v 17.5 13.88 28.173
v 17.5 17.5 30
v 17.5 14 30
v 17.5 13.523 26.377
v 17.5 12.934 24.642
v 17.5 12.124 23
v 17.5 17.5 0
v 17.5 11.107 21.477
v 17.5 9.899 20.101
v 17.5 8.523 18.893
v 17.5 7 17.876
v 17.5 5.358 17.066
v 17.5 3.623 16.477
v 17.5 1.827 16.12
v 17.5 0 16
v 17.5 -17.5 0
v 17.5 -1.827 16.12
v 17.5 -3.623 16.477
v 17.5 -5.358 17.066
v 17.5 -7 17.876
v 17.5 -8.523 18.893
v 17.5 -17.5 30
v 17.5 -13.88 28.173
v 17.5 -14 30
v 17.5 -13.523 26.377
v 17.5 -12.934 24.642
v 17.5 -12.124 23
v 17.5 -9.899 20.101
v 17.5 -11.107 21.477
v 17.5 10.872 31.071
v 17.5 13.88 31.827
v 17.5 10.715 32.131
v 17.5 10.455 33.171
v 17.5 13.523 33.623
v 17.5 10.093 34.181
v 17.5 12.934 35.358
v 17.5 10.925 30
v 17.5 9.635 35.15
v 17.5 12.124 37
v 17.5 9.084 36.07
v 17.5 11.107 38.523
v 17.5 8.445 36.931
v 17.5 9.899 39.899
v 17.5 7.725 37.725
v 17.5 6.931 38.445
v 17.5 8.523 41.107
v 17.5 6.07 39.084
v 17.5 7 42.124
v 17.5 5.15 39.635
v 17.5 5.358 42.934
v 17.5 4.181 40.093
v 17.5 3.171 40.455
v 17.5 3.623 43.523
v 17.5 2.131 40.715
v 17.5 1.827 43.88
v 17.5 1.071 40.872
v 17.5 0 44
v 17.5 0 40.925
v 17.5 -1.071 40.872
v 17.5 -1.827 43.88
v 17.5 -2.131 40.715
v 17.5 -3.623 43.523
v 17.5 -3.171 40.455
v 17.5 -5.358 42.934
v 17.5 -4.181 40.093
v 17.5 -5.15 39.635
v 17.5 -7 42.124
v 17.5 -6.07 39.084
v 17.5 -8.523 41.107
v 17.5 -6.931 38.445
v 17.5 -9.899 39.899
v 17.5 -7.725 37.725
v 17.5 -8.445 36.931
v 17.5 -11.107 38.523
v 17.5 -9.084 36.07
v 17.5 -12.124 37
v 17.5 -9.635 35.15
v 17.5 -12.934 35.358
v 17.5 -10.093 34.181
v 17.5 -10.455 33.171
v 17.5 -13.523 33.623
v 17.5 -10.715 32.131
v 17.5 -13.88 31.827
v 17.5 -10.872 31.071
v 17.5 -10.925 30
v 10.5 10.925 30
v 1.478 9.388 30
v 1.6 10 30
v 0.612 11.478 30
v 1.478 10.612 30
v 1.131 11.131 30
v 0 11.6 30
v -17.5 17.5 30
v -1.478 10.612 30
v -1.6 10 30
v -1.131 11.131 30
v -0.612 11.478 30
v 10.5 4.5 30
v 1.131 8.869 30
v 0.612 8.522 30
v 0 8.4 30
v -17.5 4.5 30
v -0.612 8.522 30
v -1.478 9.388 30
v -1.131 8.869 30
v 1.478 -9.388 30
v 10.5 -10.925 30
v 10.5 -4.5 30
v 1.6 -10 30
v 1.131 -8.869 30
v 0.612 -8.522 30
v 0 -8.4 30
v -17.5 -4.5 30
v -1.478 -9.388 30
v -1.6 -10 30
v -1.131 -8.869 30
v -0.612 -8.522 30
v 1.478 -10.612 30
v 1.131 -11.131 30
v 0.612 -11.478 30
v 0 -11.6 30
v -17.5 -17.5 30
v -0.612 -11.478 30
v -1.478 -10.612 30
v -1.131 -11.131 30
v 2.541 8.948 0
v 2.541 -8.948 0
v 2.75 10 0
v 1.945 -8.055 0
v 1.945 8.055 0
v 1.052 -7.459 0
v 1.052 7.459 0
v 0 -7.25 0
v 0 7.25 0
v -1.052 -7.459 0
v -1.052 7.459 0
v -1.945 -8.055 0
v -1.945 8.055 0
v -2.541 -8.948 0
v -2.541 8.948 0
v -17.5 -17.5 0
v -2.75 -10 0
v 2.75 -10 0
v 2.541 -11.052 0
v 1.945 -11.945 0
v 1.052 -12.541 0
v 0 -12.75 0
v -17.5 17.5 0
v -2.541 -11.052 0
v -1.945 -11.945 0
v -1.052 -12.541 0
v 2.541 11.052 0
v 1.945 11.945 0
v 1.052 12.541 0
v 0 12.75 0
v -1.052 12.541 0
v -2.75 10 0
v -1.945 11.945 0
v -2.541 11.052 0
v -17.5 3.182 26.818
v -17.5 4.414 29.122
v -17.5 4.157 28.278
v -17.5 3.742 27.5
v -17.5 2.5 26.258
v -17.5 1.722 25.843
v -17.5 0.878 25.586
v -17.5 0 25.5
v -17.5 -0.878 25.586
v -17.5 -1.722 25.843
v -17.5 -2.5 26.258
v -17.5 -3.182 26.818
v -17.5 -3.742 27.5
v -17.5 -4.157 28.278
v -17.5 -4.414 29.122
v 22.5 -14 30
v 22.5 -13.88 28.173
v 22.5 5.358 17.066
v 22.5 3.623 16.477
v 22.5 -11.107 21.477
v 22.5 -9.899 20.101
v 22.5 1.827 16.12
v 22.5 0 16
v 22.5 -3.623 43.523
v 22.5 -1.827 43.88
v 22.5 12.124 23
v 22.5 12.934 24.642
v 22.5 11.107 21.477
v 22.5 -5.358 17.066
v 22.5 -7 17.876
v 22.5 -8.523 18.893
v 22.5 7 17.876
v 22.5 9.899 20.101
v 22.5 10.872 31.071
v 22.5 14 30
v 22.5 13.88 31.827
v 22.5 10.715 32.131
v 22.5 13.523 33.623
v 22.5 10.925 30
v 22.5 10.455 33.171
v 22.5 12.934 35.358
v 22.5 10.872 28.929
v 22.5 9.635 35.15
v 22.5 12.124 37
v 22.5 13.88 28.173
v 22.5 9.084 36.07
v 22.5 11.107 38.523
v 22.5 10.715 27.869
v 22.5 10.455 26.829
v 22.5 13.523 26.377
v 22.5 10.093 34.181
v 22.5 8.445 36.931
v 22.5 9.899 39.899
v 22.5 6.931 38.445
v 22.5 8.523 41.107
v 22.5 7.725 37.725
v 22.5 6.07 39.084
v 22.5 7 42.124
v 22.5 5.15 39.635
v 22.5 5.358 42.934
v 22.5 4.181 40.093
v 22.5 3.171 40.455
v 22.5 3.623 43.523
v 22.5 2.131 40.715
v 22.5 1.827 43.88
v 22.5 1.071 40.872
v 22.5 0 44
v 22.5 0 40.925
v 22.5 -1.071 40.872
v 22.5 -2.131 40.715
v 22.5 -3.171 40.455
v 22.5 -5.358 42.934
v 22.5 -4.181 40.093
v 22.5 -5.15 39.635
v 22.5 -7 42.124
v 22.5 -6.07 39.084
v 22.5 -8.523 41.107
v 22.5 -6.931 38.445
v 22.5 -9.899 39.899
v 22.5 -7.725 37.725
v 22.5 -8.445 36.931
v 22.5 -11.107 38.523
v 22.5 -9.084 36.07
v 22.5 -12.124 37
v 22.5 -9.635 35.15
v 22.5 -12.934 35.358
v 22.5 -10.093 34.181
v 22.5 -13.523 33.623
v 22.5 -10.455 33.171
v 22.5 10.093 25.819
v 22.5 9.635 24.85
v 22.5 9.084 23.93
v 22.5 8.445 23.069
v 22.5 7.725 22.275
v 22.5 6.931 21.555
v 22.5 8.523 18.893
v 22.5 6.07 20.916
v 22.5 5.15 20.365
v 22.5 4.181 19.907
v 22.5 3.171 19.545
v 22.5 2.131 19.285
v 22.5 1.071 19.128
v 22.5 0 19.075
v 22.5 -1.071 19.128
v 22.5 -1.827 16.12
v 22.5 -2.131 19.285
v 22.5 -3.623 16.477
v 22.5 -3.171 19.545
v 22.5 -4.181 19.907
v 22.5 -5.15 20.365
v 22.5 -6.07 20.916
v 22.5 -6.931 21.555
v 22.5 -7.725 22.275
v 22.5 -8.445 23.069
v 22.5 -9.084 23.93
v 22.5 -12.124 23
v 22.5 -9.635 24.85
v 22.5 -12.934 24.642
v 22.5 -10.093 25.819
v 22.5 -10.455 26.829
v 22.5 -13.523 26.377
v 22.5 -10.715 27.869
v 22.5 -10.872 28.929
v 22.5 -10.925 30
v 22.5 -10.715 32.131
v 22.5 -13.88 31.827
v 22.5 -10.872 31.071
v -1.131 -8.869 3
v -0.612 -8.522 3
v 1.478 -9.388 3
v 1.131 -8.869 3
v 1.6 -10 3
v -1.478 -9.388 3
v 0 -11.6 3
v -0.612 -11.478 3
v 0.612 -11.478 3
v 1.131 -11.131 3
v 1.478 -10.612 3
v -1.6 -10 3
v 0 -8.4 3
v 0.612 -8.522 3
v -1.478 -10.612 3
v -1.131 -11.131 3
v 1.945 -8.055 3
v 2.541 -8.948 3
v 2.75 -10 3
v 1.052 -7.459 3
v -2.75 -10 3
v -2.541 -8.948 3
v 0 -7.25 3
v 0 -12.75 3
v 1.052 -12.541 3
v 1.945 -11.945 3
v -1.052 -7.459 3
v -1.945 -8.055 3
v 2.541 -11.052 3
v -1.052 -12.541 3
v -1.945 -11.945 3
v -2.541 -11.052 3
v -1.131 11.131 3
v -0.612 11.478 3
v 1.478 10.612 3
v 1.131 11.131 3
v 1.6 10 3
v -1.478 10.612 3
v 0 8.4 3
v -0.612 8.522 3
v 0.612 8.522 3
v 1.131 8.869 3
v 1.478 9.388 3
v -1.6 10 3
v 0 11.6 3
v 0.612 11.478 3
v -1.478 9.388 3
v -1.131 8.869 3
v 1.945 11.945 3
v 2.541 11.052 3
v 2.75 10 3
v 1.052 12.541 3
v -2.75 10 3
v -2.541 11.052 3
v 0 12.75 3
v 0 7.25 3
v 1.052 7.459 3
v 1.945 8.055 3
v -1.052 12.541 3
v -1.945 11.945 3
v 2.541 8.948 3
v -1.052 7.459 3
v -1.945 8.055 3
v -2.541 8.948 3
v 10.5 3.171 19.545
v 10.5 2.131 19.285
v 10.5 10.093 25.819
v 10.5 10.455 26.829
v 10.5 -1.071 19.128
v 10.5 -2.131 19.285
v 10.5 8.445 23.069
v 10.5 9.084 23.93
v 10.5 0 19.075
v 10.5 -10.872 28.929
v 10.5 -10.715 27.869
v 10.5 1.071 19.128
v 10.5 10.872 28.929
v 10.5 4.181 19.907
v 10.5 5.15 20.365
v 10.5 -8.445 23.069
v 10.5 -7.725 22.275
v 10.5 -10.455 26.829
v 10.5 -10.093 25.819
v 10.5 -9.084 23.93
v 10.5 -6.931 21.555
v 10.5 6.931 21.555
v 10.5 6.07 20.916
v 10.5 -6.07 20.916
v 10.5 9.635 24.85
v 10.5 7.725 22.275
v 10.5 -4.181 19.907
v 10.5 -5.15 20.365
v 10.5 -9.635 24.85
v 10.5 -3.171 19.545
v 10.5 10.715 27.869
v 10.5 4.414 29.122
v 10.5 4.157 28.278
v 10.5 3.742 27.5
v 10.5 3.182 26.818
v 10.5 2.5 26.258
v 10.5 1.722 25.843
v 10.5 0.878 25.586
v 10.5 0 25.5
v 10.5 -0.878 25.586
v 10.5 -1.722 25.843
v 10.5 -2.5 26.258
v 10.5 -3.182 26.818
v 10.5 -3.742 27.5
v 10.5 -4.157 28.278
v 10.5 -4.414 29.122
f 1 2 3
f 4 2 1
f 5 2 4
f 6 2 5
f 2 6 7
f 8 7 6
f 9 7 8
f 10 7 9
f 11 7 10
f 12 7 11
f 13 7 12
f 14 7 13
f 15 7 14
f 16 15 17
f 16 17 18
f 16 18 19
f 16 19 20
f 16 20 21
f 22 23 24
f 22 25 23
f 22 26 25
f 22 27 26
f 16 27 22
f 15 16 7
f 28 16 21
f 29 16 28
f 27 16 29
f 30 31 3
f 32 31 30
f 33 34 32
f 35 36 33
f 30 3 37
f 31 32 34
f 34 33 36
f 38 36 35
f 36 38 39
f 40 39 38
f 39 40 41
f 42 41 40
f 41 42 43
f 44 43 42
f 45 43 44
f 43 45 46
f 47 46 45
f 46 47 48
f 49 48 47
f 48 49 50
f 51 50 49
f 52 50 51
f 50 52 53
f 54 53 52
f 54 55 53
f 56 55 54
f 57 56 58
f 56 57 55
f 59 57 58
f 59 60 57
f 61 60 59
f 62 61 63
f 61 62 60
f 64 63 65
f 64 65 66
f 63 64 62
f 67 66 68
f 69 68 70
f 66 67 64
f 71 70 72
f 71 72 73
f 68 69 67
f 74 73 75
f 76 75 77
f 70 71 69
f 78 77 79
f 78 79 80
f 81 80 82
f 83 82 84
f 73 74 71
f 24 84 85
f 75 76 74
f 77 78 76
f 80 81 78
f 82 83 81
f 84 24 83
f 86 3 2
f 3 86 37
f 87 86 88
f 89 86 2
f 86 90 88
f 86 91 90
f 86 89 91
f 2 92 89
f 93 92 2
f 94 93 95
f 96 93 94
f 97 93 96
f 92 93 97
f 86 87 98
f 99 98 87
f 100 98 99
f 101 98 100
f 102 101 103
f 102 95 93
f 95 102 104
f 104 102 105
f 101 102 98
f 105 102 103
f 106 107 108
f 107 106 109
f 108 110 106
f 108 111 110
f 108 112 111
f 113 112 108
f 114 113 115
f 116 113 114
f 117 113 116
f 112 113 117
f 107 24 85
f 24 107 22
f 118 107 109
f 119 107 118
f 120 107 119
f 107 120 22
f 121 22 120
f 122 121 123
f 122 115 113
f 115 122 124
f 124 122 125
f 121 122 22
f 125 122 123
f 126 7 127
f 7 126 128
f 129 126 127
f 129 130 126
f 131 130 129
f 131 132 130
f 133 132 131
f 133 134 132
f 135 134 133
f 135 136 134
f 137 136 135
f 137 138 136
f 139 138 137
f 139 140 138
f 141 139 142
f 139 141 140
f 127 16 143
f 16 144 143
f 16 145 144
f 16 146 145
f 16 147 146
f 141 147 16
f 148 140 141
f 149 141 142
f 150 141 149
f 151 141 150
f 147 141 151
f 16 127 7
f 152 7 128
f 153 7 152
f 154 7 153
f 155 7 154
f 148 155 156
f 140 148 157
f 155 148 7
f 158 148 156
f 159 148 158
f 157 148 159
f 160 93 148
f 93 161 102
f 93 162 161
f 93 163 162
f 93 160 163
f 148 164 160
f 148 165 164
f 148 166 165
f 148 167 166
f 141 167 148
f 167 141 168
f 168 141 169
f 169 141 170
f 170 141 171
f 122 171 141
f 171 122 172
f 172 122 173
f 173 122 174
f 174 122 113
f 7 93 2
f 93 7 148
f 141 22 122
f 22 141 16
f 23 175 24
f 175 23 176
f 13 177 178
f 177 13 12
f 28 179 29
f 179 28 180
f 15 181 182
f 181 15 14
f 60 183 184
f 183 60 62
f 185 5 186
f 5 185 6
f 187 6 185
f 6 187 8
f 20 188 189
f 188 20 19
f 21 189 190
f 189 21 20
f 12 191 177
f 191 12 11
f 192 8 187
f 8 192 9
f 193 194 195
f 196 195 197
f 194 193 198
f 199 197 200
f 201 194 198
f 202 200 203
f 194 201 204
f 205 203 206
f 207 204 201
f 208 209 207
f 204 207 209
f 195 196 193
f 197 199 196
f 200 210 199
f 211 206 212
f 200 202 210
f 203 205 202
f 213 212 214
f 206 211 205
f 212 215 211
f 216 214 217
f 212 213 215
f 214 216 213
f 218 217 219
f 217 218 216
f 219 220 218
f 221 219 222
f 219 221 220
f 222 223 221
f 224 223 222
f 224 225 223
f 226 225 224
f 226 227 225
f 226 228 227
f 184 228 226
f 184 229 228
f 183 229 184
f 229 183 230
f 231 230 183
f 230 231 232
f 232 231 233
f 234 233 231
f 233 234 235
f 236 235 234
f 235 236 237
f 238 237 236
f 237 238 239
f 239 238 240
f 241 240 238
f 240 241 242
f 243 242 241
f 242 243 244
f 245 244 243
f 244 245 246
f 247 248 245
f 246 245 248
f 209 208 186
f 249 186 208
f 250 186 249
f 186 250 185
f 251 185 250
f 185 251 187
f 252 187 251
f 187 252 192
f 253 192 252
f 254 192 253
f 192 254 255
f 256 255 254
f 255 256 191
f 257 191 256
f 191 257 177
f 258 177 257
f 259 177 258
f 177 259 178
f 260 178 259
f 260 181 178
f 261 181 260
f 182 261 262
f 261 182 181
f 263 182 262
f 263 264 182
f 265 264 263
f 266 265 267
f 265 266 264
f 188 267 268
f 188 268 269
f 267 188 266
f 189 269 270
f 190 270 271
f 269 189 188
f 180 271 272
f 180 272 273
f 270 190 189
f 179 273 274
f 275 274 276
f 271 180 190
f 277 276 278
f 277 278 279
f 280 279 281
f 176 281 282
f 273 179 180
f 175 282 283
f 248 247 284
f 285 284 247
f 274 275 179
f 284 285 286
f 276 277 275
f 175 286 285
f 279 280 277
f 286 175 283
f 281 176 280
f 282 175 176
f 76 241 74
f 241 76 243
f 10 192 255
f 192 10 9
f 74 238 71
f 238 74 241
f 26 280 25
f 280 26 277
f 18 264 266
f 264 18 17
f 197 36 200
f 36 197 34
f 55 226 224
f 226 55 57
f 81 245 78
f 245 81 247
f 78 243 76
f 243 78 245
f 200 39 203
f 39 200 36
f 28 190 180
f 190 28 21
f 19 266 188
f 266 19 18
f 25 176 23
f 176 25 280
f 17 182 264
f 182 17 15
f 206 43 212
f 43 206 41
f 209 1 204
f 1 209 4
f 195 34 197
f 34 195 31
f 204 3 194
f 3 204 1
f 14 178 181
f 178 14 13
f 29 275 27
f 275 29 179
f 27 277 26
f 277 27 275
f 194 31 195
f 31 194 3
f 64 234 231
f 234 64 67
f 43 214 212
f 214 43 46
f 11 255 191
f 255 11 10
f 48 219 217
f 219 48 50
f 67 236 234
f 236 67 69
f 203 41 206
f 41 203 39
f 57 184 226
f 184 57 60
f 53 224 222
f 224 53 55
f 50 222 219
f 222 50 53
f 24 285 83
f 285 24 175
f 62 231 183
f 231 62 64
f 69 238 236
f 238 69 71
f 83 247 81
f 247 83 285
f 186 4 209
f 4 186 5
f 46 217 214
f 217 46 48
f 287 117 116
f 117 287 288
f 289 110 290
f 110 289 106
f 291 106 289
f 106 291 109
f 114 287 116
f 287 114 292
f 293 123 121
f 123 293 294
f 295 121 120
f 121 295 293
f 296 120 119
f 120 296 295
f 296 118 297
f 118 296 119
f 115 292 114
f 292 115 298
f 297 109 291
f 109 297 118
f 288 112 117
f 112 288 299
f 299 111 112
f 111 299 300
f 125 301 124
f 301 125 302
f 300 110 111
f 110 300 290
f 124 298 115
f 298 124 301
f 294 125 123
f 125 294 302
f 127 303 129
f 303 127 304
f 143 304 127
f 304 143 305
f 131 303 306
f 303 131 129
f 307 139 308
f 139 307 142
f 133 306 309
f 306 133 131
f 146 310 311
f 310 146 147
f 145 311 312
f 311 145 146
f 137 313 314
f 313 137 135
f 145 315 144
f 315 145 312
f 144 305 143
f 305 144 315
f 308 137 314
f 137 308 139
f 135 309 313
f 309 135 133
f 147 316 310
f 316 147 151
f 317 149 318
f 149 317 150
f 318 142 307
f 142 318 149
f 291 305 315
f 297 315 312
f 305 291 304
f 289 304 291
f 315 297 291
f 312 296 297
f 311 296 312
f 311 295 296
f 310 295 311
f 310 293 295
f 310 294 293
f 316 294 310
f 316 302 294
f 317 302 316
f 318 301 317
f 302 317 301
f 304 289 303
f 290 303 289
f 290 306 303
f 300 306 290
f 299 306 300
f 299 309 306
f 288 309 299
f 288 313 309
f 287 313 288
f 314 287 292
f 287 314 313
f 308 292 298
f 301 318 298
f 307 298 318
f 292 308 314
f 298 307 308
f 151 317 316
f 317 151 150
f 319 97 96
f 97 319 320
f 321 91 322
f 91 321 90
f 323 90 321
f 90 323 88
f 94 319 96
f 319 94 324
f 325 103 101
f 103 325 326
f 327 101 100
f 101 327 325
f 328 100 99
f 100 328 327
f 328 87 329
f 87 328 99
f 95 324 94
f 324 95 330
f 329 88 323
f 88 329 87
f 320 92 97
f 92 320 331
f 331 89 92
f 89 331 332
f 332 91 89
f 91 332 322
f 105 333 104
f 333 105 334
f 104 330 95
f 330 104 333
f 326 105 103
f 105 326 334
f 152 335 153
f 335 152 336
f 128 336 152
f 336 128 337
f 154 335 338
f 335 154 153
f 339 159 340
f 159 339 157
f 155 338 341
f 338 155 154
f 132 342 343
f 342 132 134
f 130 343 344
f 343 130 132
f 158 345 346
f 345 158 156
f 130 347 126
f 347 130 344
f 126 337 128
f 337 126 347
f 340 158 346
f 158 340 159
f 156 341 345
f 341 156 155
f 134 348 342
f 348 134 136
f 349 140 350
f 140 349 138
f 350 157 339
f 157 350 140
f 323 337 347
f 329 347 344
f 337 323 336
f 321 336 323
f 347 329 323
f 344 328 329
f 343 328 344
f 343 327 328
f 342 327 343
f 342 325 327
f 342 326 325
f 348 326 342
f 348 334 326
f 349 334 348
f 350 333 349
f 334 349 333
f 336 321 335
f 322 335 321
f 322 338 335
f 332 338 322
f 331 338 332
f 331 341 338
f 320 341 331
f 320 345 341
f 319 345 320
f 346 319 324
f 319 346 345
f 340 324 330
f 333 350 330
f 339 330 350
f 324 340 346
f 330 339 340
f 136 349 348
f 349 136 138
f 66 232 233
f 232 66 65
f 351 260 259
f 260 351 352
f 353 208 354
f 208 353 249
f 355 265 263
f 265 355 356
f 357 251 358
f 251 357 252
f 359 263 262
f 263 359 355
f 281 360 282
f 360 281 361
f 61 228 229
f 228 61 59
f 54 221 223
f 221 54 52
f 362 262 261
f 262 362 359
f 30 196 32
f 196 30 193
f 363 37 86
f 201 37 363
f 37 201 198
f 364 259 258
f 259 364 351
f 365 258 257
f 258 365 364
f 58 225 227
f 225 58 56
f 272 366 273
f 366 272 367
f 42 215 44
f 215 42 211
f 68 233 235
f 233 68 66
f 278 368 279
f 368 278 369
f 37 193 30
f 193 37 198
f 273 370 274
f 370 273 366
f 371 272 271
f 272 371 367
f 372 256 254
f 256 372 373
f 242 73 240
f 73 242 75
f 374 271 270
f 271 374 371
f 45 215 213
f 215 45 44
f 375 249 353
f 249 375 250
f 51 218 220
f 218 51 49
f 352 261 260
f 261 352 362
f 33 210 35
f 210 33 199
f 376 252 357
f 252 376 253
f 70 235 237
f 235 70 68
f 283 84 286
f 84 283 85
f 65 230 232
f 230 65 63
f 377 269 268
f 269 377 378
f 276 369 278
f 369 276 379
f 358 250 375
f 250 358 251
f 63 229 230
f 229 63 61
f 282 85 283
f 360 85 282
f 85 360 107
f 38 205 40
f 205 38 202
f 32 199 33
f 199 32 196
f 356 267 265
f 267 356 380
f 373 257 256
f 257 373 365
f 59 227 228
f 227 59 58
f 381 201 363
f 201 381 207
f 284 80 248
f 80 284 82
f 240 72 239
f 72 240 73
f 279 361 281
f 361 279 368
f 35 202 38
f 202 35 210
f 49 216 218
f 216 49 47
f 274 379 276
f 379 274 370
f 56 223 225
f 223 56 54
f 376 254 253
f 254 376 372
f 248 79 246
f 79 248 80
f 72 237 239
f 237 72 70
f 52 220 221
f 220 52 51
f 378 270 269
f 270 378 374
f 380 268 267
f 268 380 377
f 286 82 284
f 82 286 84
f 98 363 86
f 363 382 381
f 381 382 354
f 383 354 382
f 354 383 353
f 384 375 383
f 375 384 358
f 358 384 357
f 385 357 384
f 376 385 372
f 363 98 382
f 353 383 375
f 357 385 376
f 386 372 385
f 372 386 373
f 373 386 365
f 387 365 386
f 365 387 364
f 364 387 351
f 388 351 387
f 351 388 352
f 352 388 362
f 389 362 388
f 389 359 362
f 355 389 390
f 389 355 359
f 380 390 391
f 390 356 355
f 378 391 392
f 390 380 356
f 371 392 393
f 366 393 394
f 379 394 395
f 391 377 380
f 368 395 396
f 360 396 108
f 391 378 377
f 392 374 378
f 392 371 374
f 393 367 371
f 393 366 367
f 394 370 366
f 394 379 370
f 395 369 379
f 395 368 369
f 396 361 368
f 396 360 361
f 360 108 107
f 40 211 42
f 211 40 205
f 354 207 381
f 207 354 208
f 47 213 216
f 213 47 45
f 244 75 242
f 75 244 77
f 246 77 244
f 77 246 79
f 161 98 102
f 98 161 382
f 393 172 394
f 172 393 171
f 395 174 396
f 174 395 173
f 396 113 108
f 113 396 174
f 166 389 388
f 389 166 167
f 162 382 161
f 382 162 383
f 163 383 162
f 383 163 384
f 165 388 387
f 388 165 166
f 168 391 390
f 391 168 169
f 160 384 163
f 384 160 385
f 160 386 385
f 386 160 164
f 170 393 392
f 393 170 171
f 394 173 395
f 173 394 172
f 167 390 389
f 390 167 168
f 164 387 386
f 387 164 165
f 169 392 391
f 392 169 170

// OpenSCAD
// file: ../common.scad
/*
 * WAVE OCEAN V10 - COMMON PARAMETERS
 *
 * Shared constants, tolerances, and hardware specifications
 * All dimensions in mm
 *
 * MECHANISM: Helical groove cam drives 24 slats via follower arms
 * - Worm rotates around X axis
 * - Groove follows helix at radius GROOVE_RADIUS
 * - Follower rollers ride in groove, push slats up/down
 * - Phase difference along X creates traveling wave illusion
 */

// ============================================
// PRINT TOLERANCES (tune for your printer)
// ============================================

TOL_CLEARANCE = 0.2;         // Shaft in hole clearance
TOL_PRESS_FIT = -0.15;       // Bearing press-fit interference
TOL_SLIDING = 0.4;           // Sliding fit (guide slots)
TOL_SCREW_HOLE = 0.2;        // Screw hole clearance

// ============================================
// HARDWARE - BEARINGS
// ============================================

// 608 bearing (worm shaft)
BEARING_608_ID = 8;
BEARING_608_OD = 22;
BEARING_608_H = 7;

// 624 bearing (follower rollers)
BEARING_624_ID = 4;
BEARING_624_OD = 13;
BEARING_624_H = 5;

// ============================================
// HARDWARE - FASTENERS
// ============================================

M3_HOLE_DIA = 3 + TOL_SCREW_HOLE;      // 3.2mm
M3_HEAD_DIA = 5.5;
M3_HEAD_H = 3;
M3_NUT_FLAT = 5.5;
M3_NUT_H = 2.4;
M3_INSERT_DIA = 4.0;                    // Heat-set insert hole
M3_INSERT_DEPTH = 5;

// ============================================
// HARDWARE - SHAFTS AND PINS
// ============================================

WORM_SHAFT_DIA = 8;
WORM_SHAFT_LENGTH = 280;               // Extends beyond worm for bearings

ROLLER_AXLE_DIA = 4;
ROLLER_AXLE_LENGTH = 12;

PIVOT_PIN_DIA = 3;
PIVOT_PIN_LENGTH = 15;

// ============================================
// WORM CAM DIMENSIONS
// ============================================

WORM_LENGTH = 200;
WORM_OUTER_RADIUS = 20;              // 40mm diameter (bigger for deeper groove)
WORM_CORE_RADIUS = 10;               // 20mm diameter core
WORM_SHAFT_HOLE = WORM_SHAFT_DIA + TOL_CLEARANCE;  // 8.2mm

// Groove sized to contain 624 bearing roller
GROOVE_WIDTH = BEARING_624_H + 2;    // 7mm wide (bearing + clearance)
GROOVE_DEPTH = BEARING_624_OD/2 + 3; // 9.5mm deep (half bearing + margin)
GROOVE_RADIUS = WORM_OUTER_RADIUS - GROOVE_DEPTH/2;  // ~15mm from center

HELIX_PITCH = 25;                    // 25mm per rotation = 8 turns over 200mm

// ============================================
// SLAT DIMENSIONS
// ============================================

NUM_SLATS = 24;
SLAT_SPACING = WORM_LENGTH / NUM_SLATS;  // 8.33mm

SLAT_WIDTH = 5;                       // X dimension (slightly wider)
SLAT_DEPTH = 30;                      // Y dimension (narrower)
SLAT_HEIGHT = 40;                     // Z dimension

// Wave motion amplitude (half of total travel)
WAVE_AMPLITUDE = 10;                  // ±10mm vertical motion

// ============================================
// FOLLOWER ARM DIMENSIONS
// ============================================

ARM_LENGTH = 35;                      // Pivot to roller center (LONGER)
ARM_WIDTH = 8;
ARM_THICKNESS = 6;

PIVOT_HOLE = PIVOT_PIN_DIA + TOL_CLEARANCE;    // 3.2mm
ROLLER_AXLE_HOLE = ROLLER_AXLE_DIA + TOL_CLEARANCE;  // 4.2mm

// ============================================
// SLAT BRACKET DIMENSIONS
// ============================================

BRACKET_WIDTH = 12;
BRACKET_DEPTH = 20;
BRACKET_HEIGHT = 25;

// ============================================
// GUIDE RAIL DIMENSIONS
// ============================================

GUIDE_LENGTH = 210;
GUIDE_HEIGHT = 30;                    // Taller for more travel
GUIDE_DEPTH = 10;
GUIDE_WALL = 3;

SLOT_WIDTH = SLAT_WIDTH + TOL_SLIDING;   // Slat slides in slot, not bracket tab
SLOT_HEIGHT = WAVE_AMPLITUDE * 2 + 10;   // Allow full travel + margin

// ============================================
// BEARING BLOCK DIMENSIONS
// ============================================

BEARING_BLOCK_WIDTH = 35;
BEARING_BLOCK_DEPTH = 35;
BEARING_BLOCK_HEIGHT = 30;

BEARING_POCKET_DIA = BEARING_608_OD + TOL_PRESS_FIT;  // 21.85mm
BEARING_POCKET_DEPTH = BEARING_608_H + 1;             // 8mm

// ============================================
// BASE PLATE DIMENSIONS
// ============================================

BASE_LENGTH = 280;                    // Longer to fit everything
BASE_WIDTH = 100;                     // Wider for stability
BASE_THICKNESS = 5;

// ============================================
// MOTOR MOUNT DIMENSIONS
// ============================================

N20_BODY_DIA = 12;
N20_BODY_LENGTH = 15;
N20_GEARBOX_DIA = 10;
N20_GEARBOX_LENGTH = 12;
N20_SHAFT_DIA = 3;
N20_SHAFT_LENGTH = 10;

// ============================================
// ASSEMBLY POSITIONS
// ============================================

// Worm center position
// Shaft runs along X axis at this Z height
WORM_CENTER_Z = BASE_THICKNESS + BEARING_BLOCK_HEIGHT;  // 35mm

// Guide rail positions (front and back of slats)
// Slats are centered at Y=0, spanning ±SLAT_DEPTH/2
GUIDE_FRONT_Y = -SLAT_DEPTH/2 - GUIDE_DEPTH/2;   // -20
GUIDE_BACK_Y = SLAT_DEPTH/2 + GUIDE_DEPTH/2;     // +20

// Guide rail Z - slats hang down from here
// Positioned so slat bottom can reach groove at top of worm
GUIDE_Z = WORM_CENTER_Z + WORM_OUTER_RADIUS + SLAT_HEIGHT/2 + 5;  // 80mm

// Bearing block X positions (at ends of worm, inward facing)
BEARING_L_X = -WORM_LENGTH/2 - BEARING_BLOCK_WIDTH/2;   // -117.5
BEARING_R_X = WORM_LENGTH/2 + BEARING_BLOCK_WIDTH/2;    // +117.5

// Motor mount X position (beyond right bearing block)
MOTOR_MOUNT_X = BEARING_R_X + BEARING_BLOCK_WIDTH/2 + 30;

// ============================================
// COLORS (for assembly visualization)
// ============================================

C_WORM = [0.75, 0.55, 0.2];
C_SLAT = [0.2, 0.45, 0.75];
C_BRACKET = [0.4, 0.4, 0.45];
C_ARM = [0.5, 0.5, 0.55];
C_GUIDE = [0.35, 0.35, 0.4];
C_BEARING_BLOCK = [0.3, 0.35, 0.4];
C_BASE = [0.25, 0.25, 0.3];
C_SHAFT = [0.6, 0.6, 0.65];
C_BEARING = [0.7, 0.7, 0.75];
C_MOTOR = [0.3, 0.3, 0.35];

// ============================================
// HELPER FUNCTIONS
// ============================================

// Helix angle at position X along worm (in degrees)
function helix_angle(x) = (x / HELIX_PITCH) * 360;

// Combined phase: helix position + shaft rotation
function phase(x, theta) = helix_angle(x) + theta;

// Groove center position in Y-Z plane (polar coordinates from shaft)
// Y = radius * sin(angle), Z = center + radius * cos(angle)
function groove_y(x, theta) = GROOVE_RADIUS * sin(phase(x, theta));
function groove_z(x, theta) = WORM_CENTER_Z + GROOVE_RADIUS * cos(phase(x, theta));

// Slat X position (evenly spaced along worm length)
function slat_x(i) = i * SLAT_SPACING - WORM_LENGTH/2 + SLAT_SPACING/2;

// Slat Z position - follows groove Z position via follower arm
// When groove is at top (cos=1), slat is pushed up
// When groove is at bottom (cos=-1), slat drops down
function slat_z(i, theta) =
    let(x = slat_x(i))
    GUIDE_Z + GROOVE_RADIUS * cos(phase(x, theta)) - GROOVE_RADIUS;

// ============================================
// CLEARANCE VERIFICATION
// ============================================

// Slat gap: SLAT_SPACING - SLAT_WIDTH = 8.33 - 5 = 3.33mm ✓
// Arm reach: ARM_LENGTH = 35mm, needs to reach ~30mm ✓
// Groove depth: 9.5mm, bearing radius 6.5mm ✓
// Wave travel: ±GROOVE_RADIUS * cos variation = ±15mm

// ============================================
// QUALITY SETTINGS
// ============================================

$fn = 48;  // Default facets
// main file
/*
 * BEARING BLOCK LEFT - Left Side Bearing Mount
 *
 * Printable part: 1x
 * Print orientation: Base down
 *
 * Features:
 * - 608 bearing pocket (press fit) - HORIZONTAL orientation
 * - Shaft passes through along X axis
 * - Base mounting holes
 */

include <../common.scad>

$fn = 48;

// ============================================
// MAIN BEARING BLOCK MODULE
// ============================================

module bearing_block_L() {
    difference() {
        // Main body
        block_body();

        // Bearing pocket (horizontal, facing +X toward worm)
        bearing_pocket();

        // Shaft through hole (along X axis)
        shaft_hole();

        // Mounting holes
        mounting_holes();
    }
}

// ============================================
// BLOCK BODY
// ============================================

module block_body() {
    // Main block - taller to get shaft at right height
    translate([-BEARING_BLOCK_WIDTH/2, -BEARING_BLOCK_DEPTH/2, 0])
        cube([BEARING_BLOCK_WIDTH, BEARING_BLOCK_DEPTH, BEARING_BLOCK_HEIGHT]);

    // Bearing boss (extends toward worm, +X direction)
    translate([BEARING_BLOCK_WIDTH/2, 0, BEARING_BLOCK_HEIGHT])
    rotate([0, 90, 0])
        cylinder(d=BEARING_608_OD + 6, h=5);
}

// ============================================
// BEARING POCKET
// ============================================

module bearing_pocket() {
    // Pocket for 608 bearing - horizontal, facing +X
    // Bearing sits at top of block, shaft passes through center
    translate([BEARING_BLOCK_WIDTH/2 - BEARING_POCKET_DEPTH + 1, 0, BEARING_BLOCK_HEIGHT])
    rotate([0, 90, 0])
        cylinder(d=BEARING_POCKET_DIA, h=BEARING_POCKET_DEPTH + 5, $fn=64);
}

// ============================================
// SHAFT HOLE
// ============================================

module shaft_hole() {
    // Through hole for shaft along X axis
    shaft_clearance = WORM_SHAFT_DIA + 1;

    translate([-BEARING_BLOCK_WIDTH/2 - 1, 0, BEARING_BLOCK_HEIGHT])
    rotate([0, 90, 0])
        cylinder(d=shaft_clearance, h=BEARING_BLOCK_WIDTH + 10, $fn=32);
}

// ============================================
// MOUNTING HOLES
// ============================================

module mounting_holes() {
    // 2x M3 holes for base attachment
    hole_spacing = 20;

    for (y = [-hole_spacing/2, hole_spacing/2]) {
        translate([0, y, -1]) {
            // Through hole
            cylinder(d=M3_HOLE_DIA, h=BEARING_BLOCK_HEIGHT + 2, $fn=16);

            // Countersink at bottom
            cylinder(d=M3_HEAD_DIA, h=M3_HEAD_H + 1, $fn=16);
        }
    }
}

// ============================================
// RENDER
// ============================================

color(C_BEARING_BLOCK)
bearing_block_L();

// Visualization: 608 bearing in horizontal position
%translate([BEARING_BLOCK_WIDTH/2 - BEARING_608_H/2, 0, BEARING_BLOCK_HEIGHT])
rotate([0, 90, 0])
    difference() {
        cylinder(d=BEARING_608_OD, h=BEARING_608_H, center=true, $fn=48);
        cylinder(d=BEARING_608_ID, h=BEARING_608_H + 1, center=true, $fn=32);
    }

// ============================================
// INFO
// ============================================

echo("=== BEARING BLOCK LEFT ===");
echo(str("Block size: ", BEARING_BLOCK_WIDTH, "x", BEARING_BLOCK_DEPTH, "x", BEARING_BLOCK_HEIGHT, "mm"));
echo(str("Bearing pocket: ", BEARING_POCKET_DIA, "mm dia x ", BEARING_POCKET_DEPTH, "mm deep"));
echo(str("Shaft height from base: ", BEARING_BLOCK_HEIGHT, "mm"));
echo("");
echo("Print quantity: 1");
echo("Print orientation: Base down");
echo("Post-process: Press 608 bearing into pocket from +X side");
